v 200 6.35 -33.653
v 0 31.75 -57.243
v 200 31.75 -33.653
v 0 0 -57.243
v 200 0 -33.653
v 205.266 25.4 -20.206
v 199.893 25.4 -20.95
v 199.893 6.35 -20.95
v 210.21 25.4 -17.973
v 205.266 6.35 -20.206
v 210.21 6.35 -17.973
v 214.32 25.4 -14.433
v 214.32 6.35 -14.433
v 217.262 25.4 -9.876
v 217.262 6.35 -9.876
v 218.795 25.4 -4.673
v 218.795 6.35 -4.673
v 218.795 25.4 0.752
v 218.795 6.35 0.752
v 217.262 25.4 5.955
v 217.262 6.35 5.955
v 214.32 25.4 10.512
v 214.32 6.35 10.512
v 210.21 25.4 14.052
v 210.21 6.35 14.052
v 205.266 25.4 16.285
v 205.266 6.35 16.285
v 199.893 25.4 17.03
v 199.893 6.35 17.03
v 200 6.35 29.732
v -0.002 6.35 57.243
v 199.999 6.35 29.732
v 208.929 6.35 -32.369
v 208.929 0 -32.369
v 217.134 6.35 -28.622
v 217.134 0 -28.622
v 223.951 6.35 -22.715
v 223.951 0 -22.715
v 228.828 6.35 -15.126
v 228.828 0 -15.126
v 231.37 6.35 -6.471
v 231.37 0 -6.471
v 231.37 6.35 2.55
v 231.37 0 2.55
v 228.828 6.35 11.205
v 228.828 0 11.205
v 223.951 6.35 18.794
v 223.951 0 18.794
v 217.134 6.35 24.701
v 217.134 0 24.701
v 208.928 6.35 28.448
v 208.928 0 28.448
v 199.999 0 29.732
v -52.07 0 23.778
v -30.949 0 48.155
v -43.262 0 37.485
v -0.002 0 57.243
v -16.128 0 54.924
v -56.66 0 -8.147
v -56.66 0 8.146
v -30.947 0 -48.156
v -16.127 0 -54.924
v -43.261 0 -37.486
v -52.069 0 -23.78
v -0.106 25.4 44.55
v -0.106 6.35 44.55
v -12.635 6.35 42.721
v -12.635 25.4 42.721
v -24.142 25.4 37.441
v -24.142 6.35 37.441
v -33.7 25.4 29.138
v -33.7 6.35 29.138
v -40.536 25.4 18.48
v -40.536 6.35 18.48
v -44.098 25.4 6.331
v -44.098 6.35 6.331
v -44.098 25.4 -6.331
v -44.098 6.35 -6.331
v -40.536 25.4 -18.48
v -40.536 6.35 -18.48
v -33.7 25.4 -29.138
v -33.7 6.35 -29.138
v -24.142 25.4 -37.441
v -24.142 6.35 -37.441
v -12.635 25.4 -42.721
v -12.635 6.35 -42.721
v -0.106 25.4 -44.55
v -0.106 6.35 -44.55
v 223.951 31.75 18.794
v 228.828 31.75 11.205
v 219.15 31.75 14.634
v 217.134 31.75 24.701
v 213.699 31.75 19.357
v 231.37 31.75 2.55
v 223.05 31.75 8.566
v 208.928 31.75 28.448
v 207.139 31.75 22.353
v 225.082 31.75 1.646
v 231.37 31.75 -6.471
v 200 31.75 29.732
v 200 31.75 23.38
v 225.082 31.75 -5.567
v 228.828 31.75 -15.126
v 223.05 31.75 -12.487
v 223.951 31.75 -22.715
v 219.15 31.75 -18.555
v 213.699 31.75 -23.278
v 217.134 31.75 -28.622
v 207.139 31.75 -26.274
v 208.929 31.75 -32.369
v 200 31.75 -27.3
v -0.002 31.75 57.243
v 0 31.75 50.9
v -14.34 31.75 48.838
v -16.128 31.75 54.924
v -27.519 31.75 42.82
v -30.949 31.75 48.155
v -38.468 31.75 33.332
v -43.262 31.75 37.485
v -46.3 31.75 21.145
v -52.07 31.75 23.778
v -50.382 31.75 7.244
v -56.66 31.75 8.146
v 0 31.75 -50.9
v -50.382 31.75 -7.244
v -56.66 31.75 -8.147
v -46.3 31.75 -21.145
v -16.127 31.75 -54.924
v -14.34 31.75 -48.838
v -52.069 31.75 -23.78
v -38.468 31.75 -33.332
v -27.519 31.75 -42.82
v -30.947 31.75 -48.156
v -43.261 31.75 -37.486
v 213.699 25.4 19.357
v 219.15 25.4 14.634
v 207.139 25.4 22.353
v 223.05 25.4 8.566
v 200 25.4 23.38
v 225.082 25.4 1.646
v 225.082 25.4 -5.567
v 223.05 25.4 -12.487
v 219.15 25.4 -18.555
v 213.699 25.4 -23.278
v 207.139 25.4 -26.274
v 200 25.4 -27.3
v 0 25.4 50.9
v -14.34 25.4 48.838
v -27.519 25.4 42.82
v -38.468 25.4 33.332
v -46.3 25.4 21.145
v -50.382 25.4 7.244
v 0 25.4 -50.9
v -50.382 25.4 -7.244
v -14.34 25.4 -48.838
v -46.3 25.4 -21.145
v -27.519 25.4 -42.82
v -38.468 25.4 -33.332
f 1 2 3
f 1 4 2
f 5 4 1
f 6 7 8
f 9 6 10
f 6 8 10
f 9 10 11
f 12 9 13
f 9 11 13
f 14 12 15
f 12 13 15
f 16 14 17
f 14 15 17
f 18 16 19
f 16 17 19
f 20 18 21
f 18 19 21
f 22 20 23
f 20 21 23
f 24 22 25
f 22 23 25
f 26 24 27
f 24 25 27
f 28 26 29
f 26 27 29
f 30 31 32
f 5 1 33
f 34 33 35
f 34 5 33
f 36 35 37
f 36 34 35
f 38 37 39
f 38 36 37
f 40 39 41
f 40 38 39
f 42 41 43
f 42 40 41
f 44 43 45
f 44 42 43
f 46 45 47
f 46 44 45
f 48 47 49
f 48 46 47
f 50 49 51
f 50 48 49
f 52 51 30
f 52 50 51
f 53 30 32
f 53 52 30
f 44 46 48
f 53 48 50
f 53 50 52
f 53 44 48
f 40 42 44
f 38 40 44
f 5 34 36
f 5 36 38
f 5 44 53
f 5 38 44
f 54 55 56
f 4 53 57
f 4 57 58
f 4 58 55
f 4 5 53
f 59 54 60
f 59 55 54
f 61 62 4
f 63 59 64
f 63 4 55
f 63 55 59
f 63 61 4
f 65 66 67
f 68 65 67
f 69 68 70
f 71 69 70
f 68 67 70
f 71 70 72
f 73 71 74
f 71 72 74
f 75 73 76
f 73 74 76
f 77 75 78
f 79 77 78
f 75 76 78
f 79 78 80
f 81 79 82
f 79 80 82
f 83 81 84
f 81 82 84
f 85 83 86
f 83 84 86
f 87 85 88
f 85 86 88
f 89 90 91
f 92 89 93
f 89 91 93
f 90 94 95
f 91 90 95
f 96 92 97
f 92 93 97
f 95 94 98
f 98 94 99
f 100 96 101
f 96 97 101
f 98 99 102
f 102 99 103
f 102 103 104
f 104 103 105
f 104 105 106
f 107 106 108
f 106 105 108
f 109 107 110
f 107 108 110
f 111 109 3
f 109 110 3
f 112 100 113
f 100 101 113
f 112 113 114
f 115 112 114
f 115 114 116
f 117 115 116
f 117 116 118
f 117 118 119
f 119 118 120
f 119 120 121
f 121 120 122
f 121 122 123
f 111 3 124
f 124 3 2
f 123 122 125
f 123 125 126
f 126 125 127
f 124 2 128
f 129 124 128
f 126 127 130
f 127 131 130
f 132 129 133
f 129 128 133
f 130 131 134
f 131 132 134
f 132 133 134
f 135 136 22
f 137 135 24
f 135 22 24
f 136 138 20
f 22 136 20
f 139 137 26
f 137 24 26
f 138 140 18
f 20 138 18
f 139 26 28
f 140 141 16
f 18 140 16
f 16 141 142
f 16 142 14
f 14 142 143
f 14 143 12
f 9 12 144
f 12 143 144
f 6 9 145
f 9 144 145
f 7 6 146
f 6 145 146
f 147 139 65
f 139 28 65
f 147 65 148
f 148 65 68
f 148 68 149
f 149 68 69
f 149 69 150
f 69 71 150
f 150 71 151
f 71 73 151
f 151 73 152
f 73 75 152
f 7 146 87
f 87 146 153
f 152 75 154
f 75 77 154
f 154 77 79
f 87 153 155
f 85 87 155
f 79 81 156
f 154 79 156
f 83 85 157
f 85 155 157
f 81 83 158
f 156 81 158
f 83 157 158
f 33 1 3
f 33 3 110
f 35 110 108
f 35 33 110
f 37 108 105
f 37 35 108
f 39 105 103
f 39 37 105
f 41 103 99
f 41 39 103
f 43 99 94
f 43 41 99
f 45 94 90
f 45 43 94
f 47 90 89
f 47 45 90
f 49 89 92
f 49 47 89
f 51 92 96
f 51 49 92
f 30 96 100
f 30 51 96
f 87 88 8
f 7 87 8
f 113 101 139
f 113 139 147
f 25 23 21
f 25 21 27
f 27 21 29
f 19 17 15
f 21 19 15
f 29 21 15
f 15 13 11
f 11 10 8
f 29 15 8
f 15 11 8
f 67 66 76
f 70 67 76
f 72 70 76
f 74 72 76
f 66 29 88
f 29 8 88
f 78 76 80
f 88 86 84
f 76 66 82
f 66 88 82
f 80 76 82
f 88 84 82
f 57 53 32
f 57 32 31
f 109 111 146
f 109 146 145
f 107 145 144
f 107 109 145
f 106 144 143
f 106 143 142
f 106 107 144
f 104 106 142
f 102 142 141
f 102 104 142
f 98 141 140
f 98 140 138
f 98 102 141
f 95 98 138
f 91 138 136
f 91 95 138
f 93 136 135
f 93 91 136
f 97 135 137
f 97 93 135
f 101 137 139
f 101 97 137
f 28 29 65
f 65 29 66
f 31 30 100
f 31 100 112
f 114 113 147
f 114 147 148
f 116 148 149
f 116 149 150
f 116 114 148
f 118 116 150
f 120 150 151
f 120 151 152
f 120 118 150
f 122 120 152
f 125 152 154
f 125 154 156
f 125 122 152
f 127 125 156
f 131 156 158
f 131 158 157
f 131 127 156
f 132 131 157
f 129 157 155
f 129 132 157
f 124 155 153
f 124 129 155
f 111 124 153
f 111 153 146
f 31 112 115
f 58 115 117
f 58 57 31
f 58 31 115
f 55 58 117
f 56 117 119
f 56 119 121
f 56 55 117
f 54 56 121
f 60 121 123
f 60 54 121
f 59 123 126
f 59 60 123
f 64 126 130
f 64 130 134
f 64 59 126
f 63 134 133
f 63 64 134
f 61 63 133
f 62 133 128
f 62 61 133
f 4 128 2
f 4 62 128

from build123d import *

# Parameters (mm, degrees)
BOSS_EXTRUDE1_DEPTH = 6.35
BOSS_EXTRUDE3_DEPTH = 25.4
CUT_EXTRUDE2_DEPTH  = 6.35


with BuildPart() as part:
    # Sketch1 → Boss-Extrude1 (new body)
    with BuildSketch(Plane(origin=(0, 0, 0), x_dir=(1, 0, 0), z_dir=(0, 1, 0))):
        with BuildLine():
            Line((0.000313665, 57.24265935), (199.999794406, 33.65314008))
            ThreePointArc((199.999794406, 33.65314008), (231.692215245, 1.96024222), (199.999317386, -29.732178619))
            Line((199.999317386, -29.732178619), (-0.001522287, -57.242659331))
            ThreePointArc((-0.001522287, -57.242659331), (-57.242659343, 0.000917976), (0.000313665, 57.24265935))
        make_face()
    extrude(amount=BOSS_EXTRUDE1_DEPTH)

    # Sketch5 → Boss-Extrude3 (add)
    with BuildSketch(Plane(origin=(0, 6.35, 0), x_dir=(1, 0, 0), z_dir=(0, 1, 0))):
        with BuildLine():
            Line((0.000313665, 57.24265935), (199.999794406, 33.65314008))
            ThreePointArc((199.999794406, 33.65314008), (231.692215246, 1.960361475), (199.999555896, -29.73217862))
            Line((199.999555896, -29.73217862), (-0.001522287, -57.242659331))
            ThreePointArc((-0.001522287, -57.242659331), (-57.242659343, 0.000917976), (0.000313665, 57.24265935))
        make_face()
        with BuildLine():
            Line((-0.10621345, 44.55), (199.893342446, 20.95048073))
            ThreePointArc((199.893342446, 20.95048073), (218.989852926, 1.96048073), (199.893342446, -17.02951927))
            Line((199.893342446, -17.02951927), (-0.10621345, -44.55))
            ThreePointArc((-0.10621345, -44.55), (-44.550126614, 0), (-0.10621345, 44.55))
        make_face(mode=Mode.SUBTRACT)
    extrude(amount=BOSS_EXTRUDE3_DEPTH)

    # Sketch6 → Cut-Extrude2 (cut)
    with BuildSketch(Plane(origin=(0, 31.75, 0), x_dir=(1, 0, 0), z_dir=(0, 1, 0))):
        with BuildLine():
            Line((0, 50.9), (199.999555896, 27.30048073))
            ThreePointArc((199.999555896, 27.30048073), (225.339555896, 1.96048073), (199.999555896, -23.37951927))
            Line((199.999555896, -23.37951927), (0, -50.9))
            ThreePointArc((0, -50.9), (-50.9, 0), (0, 50.9))
        make_face()
    extrude(amount=-CUT_EXTRUDE2_DEPTH, mode=Mode.SUBTRACT)


solid = part.part
